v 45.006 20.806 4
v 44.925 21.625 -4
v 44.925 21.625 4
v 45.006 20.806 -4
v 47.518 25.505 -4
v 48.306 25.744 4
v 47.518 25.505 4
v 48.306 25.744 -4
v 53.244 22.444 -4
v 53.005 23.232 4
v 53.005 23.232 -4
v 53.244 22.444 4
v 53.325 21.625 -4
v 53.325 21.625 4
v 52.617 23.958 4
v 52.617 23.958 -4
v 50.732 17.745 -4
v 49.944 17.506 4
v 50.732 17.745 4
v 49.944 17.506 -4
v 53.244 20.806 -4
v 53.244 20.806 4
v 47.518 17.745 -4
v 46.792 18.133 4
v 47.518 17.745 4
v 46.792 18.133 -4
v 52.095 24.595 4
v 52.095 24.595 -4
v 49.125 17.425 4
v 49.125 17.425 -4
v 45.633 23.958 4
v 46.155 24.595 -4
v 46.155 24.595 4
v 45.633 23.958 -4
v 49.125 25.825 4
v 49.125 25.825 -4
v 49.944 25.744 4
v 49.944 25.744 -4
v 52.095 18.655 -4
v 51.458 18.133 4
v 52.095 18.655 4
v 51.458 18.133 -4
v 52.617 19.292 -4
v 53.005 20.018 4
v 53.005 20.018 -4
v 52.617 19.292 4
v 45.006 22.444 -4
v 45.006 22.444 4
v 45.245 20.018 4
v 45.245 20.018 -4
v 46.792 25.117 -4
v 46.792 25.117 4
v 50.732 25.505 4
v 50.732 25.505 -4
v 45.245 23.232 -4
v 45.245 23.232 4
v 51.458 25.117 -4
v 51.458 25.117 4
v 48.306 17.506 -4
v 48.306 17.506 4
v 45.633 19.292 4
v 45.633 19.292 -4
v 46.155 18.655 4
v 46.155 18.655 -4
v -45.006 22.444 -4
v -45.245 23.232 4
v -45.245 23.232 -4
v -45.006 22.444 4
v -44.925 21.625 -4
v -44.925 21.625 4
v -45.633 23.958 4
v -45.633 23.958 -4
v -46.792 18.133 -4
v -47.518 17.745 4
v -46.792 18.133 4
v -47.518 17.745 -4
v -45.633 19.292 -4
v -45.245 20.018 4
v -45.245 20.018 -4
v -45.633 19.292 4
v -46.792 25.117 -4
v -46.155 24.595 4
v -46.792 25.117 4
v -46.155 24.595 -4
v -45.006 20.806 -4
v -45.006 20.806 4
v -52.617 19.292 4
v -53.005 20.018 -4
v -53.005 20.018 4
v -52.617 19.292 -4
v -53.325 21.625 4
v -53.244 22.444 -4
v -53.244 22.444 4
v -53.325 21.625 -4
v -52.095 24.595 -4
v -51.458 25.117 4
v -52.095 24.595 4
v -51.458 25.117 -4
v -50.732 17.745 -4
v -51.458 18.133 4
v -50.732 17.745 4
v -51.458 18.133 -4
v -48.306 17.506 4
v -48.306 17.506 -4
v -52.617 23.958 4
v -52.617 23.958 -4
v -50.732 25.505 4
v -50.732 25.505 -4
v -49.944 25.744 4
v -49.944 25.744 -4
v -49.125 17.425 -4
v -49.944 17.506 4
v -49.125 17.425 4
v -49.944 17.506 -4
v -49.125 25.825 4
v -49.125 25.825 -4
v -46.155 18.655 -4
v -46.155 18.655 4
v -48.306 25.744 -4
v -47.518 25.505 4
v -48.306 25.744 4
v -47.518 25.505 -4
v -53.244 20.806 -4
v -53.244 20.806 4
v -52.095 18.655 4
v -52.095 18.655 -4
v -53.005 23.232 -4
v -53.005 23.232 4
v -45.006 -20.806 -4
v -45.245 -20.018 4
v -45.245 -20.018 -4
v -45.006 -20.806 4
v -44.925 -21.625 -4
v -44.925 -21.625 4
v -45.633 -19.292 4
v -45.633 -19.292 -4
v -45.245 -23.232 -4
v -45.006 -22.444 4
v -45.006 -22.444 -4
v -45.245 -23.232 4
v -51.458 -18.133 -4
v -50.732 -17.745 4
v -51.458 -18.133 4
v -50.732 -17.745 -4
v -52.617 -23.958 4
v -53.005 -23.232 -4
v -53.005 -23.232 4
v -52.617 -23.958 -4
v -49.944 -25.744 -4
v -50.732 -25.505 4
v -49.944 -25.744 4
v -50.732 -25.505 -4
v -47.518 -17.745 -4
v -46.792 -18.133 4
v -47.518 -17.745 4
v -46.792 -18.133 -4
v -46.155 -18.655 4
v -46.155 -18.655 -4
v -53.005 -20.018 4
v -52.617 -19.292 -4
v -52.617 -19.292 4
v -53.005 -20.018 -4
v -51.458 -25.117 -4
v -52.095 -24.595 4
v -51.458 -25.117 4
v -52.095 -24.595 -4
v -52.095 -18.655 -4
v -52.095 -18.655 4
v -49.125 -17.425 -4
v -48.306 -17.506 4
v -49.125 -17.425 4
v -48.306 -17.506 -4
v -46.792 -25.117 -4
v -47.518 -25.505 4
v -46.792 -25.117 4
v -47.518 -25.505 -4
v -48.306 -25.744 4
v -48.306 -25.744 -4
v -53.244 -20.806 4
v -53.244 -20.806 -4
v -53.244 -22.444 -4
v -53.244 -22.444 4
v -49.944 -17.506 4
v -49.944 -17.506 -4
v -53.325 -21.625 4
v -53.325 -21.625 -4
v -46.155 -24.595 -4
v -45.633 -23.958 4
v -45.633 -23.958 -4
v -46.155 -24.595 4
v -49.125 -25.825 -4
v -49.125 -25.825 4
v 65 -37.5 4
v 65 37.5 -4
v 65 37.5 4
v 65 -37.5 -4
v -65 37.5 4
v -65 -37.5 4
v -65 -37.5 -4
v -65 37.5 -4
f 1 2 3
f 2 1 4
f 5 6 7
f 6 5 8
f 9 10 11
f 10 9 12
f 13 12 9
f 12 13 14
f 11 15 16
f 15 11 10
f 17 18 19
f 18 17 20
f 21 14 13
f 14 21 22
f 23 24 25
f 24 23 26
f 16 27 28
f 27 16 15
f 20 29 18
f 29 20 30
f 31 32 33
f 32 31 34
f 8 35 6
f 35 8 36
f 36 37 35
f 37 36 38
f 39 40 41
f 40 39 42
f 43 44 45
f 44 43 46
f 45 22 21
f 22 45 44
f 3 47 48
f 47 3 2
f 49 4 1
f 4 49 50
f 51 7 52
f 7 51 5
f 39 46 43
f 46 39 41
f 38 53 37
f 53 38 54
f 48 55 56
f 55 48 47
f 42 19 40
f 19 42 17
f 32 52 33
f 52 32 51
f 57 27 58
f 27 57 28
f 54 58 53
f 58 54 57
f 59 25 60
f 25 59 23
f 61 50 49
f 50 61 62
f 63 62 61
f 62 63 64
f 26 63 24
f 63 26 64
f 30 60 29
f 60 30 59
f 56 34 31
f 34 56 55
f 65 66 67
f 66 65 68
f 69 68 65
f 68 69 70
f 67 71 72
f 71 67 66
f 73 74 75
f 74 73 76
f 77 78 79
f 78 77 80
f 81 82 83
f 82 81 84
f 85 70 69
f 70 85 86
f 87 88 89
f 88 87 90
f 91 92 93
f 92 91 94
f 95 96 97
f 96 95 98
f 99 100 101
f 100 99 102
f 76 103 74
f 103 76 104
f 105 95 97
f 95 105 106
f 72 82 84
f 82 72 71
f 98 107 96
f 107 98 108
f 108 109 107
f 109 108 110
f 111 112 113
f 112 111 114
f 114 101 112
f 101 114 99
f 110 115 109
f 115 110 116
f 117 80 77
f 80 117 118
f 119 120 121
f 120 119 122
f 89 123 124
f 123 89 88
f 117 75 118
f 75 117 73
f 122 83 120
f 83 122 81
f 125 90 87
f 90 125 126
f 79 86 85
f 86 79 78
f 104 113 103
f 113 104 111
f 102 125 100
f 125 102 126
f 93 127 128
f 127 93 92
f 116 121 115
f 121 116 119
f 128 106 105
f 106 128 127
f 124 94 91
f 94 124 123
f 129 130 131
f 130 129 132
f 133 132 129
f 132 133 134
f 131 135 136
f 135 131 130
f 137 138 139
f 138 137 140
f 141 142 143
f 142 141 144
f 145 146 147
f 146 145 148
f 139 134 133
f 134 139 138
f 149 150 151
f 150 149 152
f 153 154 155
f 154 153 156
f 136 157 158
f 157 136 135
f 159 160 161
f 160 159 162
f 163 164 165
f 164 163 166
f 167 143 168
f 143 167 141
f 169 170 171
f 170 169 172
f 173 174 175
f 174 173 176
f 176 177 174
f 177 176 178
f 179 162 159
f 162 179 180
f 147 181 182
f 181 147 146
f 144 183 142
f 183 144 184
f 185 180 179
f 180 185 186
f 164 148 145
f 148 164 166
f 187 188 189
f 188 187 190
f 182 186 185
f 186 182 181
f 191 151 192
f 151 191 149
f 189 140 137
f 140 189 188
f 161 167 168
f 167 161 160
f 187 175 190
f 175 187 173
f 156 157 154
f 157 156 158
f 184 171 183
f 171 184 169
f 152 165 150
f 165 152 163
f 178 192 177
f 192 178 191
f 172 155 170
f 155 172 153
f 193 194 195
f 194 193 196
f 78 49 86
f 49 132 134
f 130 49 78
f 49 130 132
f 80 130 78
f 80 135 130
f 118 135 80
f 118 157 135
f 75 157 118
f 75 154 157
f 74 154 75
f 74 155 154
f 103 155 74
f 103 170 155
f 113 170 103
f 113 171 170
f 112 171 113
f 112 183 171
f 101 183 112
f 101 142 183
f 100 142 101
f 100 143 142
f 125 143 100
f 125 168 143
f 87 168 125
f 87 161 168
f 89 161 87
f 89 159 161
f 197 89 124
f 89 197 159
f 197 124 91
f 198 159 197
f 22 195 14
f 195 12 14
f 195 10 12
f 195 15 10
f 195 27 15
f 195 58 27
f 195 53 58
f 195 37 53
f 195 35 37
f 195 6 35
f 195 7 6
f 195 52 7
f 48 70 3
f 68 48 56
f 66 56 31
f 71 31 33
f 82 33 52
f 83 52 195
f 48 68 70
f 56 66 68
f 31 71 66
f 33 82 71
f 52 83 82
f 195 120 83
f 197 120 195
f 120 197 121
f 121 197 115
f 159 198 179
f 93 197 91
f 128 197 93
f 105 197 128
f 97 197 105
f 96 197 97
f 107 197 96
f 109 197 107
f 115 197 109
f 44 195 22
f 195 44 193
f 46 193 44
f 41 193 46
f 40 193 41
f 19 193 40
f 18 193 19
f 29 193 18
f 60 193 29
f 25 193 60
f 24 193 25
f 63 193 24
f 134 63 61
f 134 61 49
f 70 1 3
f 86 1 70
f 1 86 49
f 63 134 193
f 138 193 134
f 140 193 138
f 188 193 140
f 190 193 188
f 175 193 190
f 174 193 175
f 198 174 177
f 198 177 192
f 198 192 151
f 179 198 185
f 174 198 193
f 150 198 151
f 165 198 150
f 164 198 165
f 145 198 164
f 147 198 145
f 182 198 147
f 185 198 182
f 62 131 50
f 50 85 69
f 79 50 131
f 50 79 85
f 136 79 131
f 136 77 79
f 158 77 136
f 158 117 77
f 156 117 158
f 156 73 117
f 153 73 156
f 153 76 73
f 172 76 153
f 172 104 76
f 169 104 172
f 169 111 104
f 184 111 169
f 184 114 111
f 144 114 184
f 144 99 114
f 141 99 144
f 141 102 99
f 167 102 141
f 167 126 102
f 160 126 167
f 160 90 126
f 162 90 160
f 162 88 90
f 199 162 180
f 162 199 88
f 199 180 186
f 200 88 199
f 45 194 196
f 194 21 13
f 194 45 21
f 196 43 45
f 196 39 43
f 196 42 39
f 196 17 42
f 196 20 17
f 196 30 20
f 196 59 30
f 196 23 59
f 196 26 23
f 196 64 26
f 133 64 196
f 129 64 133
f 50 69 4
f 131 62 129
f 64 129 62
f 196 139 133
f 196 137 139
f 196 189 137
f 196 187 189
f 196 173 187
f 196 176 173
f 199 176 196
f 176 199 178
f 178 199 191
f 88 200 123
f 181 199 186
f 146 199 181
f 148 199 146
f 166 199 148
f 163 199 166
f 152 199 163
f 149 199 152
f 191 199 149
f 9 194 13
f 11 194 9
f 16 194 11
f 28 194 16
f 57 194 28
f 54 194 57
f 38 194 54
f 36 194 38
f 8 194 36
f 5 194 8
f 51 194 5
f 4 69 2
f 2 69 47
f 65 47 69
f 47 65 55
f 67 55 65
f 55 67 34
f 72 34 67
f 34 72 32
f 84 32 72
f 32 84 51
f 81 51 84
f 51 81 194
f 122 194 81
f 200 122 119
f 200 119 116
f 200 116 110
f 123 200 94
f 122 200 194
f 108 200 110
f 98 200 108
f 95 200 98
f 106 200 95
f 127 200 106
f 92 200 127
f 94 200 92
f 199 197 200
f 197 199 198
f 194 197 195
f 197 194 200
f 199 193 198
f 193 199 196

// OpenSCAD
$fn = 32;

// ----------------------------------------------------------------------
// Corner plate 130 x 75 x 8
// 3 holes, centres taken from the edge offset
// ----------------------------------------------------------------------

// --- parameters (mm) ---
plate = [130, 75, 8];  // overall size (x, y, z)
holes = 3;             // number of holes the drawing asks for
hole_d = 8.4;          // hole diameter
edge = 15.875;         // hole centre offset from the plate edge

// --- derived feature positions (mm) ---
corner_x = plate[0] / 2 - edge;  // = 49.12   corner hole X
corner_y = plate[1] / 2 - edge;  // = 21.62   corner hole Y
feature_centers = [
  [corner_x, corner_y],
  [-corner_x, corner_y],
  [-corner_x, -corner_y]
];   // hole centres the loop below drills

// plate outline, every hole drilled through with the same cutters
difference() {
  cube(plate, center = true);
  for (centre = feature_centers)
    translate([centre[0], centre[1], 0])
      cylinder(d = hole_d, h = plate[2] + 2, center = true);
}
